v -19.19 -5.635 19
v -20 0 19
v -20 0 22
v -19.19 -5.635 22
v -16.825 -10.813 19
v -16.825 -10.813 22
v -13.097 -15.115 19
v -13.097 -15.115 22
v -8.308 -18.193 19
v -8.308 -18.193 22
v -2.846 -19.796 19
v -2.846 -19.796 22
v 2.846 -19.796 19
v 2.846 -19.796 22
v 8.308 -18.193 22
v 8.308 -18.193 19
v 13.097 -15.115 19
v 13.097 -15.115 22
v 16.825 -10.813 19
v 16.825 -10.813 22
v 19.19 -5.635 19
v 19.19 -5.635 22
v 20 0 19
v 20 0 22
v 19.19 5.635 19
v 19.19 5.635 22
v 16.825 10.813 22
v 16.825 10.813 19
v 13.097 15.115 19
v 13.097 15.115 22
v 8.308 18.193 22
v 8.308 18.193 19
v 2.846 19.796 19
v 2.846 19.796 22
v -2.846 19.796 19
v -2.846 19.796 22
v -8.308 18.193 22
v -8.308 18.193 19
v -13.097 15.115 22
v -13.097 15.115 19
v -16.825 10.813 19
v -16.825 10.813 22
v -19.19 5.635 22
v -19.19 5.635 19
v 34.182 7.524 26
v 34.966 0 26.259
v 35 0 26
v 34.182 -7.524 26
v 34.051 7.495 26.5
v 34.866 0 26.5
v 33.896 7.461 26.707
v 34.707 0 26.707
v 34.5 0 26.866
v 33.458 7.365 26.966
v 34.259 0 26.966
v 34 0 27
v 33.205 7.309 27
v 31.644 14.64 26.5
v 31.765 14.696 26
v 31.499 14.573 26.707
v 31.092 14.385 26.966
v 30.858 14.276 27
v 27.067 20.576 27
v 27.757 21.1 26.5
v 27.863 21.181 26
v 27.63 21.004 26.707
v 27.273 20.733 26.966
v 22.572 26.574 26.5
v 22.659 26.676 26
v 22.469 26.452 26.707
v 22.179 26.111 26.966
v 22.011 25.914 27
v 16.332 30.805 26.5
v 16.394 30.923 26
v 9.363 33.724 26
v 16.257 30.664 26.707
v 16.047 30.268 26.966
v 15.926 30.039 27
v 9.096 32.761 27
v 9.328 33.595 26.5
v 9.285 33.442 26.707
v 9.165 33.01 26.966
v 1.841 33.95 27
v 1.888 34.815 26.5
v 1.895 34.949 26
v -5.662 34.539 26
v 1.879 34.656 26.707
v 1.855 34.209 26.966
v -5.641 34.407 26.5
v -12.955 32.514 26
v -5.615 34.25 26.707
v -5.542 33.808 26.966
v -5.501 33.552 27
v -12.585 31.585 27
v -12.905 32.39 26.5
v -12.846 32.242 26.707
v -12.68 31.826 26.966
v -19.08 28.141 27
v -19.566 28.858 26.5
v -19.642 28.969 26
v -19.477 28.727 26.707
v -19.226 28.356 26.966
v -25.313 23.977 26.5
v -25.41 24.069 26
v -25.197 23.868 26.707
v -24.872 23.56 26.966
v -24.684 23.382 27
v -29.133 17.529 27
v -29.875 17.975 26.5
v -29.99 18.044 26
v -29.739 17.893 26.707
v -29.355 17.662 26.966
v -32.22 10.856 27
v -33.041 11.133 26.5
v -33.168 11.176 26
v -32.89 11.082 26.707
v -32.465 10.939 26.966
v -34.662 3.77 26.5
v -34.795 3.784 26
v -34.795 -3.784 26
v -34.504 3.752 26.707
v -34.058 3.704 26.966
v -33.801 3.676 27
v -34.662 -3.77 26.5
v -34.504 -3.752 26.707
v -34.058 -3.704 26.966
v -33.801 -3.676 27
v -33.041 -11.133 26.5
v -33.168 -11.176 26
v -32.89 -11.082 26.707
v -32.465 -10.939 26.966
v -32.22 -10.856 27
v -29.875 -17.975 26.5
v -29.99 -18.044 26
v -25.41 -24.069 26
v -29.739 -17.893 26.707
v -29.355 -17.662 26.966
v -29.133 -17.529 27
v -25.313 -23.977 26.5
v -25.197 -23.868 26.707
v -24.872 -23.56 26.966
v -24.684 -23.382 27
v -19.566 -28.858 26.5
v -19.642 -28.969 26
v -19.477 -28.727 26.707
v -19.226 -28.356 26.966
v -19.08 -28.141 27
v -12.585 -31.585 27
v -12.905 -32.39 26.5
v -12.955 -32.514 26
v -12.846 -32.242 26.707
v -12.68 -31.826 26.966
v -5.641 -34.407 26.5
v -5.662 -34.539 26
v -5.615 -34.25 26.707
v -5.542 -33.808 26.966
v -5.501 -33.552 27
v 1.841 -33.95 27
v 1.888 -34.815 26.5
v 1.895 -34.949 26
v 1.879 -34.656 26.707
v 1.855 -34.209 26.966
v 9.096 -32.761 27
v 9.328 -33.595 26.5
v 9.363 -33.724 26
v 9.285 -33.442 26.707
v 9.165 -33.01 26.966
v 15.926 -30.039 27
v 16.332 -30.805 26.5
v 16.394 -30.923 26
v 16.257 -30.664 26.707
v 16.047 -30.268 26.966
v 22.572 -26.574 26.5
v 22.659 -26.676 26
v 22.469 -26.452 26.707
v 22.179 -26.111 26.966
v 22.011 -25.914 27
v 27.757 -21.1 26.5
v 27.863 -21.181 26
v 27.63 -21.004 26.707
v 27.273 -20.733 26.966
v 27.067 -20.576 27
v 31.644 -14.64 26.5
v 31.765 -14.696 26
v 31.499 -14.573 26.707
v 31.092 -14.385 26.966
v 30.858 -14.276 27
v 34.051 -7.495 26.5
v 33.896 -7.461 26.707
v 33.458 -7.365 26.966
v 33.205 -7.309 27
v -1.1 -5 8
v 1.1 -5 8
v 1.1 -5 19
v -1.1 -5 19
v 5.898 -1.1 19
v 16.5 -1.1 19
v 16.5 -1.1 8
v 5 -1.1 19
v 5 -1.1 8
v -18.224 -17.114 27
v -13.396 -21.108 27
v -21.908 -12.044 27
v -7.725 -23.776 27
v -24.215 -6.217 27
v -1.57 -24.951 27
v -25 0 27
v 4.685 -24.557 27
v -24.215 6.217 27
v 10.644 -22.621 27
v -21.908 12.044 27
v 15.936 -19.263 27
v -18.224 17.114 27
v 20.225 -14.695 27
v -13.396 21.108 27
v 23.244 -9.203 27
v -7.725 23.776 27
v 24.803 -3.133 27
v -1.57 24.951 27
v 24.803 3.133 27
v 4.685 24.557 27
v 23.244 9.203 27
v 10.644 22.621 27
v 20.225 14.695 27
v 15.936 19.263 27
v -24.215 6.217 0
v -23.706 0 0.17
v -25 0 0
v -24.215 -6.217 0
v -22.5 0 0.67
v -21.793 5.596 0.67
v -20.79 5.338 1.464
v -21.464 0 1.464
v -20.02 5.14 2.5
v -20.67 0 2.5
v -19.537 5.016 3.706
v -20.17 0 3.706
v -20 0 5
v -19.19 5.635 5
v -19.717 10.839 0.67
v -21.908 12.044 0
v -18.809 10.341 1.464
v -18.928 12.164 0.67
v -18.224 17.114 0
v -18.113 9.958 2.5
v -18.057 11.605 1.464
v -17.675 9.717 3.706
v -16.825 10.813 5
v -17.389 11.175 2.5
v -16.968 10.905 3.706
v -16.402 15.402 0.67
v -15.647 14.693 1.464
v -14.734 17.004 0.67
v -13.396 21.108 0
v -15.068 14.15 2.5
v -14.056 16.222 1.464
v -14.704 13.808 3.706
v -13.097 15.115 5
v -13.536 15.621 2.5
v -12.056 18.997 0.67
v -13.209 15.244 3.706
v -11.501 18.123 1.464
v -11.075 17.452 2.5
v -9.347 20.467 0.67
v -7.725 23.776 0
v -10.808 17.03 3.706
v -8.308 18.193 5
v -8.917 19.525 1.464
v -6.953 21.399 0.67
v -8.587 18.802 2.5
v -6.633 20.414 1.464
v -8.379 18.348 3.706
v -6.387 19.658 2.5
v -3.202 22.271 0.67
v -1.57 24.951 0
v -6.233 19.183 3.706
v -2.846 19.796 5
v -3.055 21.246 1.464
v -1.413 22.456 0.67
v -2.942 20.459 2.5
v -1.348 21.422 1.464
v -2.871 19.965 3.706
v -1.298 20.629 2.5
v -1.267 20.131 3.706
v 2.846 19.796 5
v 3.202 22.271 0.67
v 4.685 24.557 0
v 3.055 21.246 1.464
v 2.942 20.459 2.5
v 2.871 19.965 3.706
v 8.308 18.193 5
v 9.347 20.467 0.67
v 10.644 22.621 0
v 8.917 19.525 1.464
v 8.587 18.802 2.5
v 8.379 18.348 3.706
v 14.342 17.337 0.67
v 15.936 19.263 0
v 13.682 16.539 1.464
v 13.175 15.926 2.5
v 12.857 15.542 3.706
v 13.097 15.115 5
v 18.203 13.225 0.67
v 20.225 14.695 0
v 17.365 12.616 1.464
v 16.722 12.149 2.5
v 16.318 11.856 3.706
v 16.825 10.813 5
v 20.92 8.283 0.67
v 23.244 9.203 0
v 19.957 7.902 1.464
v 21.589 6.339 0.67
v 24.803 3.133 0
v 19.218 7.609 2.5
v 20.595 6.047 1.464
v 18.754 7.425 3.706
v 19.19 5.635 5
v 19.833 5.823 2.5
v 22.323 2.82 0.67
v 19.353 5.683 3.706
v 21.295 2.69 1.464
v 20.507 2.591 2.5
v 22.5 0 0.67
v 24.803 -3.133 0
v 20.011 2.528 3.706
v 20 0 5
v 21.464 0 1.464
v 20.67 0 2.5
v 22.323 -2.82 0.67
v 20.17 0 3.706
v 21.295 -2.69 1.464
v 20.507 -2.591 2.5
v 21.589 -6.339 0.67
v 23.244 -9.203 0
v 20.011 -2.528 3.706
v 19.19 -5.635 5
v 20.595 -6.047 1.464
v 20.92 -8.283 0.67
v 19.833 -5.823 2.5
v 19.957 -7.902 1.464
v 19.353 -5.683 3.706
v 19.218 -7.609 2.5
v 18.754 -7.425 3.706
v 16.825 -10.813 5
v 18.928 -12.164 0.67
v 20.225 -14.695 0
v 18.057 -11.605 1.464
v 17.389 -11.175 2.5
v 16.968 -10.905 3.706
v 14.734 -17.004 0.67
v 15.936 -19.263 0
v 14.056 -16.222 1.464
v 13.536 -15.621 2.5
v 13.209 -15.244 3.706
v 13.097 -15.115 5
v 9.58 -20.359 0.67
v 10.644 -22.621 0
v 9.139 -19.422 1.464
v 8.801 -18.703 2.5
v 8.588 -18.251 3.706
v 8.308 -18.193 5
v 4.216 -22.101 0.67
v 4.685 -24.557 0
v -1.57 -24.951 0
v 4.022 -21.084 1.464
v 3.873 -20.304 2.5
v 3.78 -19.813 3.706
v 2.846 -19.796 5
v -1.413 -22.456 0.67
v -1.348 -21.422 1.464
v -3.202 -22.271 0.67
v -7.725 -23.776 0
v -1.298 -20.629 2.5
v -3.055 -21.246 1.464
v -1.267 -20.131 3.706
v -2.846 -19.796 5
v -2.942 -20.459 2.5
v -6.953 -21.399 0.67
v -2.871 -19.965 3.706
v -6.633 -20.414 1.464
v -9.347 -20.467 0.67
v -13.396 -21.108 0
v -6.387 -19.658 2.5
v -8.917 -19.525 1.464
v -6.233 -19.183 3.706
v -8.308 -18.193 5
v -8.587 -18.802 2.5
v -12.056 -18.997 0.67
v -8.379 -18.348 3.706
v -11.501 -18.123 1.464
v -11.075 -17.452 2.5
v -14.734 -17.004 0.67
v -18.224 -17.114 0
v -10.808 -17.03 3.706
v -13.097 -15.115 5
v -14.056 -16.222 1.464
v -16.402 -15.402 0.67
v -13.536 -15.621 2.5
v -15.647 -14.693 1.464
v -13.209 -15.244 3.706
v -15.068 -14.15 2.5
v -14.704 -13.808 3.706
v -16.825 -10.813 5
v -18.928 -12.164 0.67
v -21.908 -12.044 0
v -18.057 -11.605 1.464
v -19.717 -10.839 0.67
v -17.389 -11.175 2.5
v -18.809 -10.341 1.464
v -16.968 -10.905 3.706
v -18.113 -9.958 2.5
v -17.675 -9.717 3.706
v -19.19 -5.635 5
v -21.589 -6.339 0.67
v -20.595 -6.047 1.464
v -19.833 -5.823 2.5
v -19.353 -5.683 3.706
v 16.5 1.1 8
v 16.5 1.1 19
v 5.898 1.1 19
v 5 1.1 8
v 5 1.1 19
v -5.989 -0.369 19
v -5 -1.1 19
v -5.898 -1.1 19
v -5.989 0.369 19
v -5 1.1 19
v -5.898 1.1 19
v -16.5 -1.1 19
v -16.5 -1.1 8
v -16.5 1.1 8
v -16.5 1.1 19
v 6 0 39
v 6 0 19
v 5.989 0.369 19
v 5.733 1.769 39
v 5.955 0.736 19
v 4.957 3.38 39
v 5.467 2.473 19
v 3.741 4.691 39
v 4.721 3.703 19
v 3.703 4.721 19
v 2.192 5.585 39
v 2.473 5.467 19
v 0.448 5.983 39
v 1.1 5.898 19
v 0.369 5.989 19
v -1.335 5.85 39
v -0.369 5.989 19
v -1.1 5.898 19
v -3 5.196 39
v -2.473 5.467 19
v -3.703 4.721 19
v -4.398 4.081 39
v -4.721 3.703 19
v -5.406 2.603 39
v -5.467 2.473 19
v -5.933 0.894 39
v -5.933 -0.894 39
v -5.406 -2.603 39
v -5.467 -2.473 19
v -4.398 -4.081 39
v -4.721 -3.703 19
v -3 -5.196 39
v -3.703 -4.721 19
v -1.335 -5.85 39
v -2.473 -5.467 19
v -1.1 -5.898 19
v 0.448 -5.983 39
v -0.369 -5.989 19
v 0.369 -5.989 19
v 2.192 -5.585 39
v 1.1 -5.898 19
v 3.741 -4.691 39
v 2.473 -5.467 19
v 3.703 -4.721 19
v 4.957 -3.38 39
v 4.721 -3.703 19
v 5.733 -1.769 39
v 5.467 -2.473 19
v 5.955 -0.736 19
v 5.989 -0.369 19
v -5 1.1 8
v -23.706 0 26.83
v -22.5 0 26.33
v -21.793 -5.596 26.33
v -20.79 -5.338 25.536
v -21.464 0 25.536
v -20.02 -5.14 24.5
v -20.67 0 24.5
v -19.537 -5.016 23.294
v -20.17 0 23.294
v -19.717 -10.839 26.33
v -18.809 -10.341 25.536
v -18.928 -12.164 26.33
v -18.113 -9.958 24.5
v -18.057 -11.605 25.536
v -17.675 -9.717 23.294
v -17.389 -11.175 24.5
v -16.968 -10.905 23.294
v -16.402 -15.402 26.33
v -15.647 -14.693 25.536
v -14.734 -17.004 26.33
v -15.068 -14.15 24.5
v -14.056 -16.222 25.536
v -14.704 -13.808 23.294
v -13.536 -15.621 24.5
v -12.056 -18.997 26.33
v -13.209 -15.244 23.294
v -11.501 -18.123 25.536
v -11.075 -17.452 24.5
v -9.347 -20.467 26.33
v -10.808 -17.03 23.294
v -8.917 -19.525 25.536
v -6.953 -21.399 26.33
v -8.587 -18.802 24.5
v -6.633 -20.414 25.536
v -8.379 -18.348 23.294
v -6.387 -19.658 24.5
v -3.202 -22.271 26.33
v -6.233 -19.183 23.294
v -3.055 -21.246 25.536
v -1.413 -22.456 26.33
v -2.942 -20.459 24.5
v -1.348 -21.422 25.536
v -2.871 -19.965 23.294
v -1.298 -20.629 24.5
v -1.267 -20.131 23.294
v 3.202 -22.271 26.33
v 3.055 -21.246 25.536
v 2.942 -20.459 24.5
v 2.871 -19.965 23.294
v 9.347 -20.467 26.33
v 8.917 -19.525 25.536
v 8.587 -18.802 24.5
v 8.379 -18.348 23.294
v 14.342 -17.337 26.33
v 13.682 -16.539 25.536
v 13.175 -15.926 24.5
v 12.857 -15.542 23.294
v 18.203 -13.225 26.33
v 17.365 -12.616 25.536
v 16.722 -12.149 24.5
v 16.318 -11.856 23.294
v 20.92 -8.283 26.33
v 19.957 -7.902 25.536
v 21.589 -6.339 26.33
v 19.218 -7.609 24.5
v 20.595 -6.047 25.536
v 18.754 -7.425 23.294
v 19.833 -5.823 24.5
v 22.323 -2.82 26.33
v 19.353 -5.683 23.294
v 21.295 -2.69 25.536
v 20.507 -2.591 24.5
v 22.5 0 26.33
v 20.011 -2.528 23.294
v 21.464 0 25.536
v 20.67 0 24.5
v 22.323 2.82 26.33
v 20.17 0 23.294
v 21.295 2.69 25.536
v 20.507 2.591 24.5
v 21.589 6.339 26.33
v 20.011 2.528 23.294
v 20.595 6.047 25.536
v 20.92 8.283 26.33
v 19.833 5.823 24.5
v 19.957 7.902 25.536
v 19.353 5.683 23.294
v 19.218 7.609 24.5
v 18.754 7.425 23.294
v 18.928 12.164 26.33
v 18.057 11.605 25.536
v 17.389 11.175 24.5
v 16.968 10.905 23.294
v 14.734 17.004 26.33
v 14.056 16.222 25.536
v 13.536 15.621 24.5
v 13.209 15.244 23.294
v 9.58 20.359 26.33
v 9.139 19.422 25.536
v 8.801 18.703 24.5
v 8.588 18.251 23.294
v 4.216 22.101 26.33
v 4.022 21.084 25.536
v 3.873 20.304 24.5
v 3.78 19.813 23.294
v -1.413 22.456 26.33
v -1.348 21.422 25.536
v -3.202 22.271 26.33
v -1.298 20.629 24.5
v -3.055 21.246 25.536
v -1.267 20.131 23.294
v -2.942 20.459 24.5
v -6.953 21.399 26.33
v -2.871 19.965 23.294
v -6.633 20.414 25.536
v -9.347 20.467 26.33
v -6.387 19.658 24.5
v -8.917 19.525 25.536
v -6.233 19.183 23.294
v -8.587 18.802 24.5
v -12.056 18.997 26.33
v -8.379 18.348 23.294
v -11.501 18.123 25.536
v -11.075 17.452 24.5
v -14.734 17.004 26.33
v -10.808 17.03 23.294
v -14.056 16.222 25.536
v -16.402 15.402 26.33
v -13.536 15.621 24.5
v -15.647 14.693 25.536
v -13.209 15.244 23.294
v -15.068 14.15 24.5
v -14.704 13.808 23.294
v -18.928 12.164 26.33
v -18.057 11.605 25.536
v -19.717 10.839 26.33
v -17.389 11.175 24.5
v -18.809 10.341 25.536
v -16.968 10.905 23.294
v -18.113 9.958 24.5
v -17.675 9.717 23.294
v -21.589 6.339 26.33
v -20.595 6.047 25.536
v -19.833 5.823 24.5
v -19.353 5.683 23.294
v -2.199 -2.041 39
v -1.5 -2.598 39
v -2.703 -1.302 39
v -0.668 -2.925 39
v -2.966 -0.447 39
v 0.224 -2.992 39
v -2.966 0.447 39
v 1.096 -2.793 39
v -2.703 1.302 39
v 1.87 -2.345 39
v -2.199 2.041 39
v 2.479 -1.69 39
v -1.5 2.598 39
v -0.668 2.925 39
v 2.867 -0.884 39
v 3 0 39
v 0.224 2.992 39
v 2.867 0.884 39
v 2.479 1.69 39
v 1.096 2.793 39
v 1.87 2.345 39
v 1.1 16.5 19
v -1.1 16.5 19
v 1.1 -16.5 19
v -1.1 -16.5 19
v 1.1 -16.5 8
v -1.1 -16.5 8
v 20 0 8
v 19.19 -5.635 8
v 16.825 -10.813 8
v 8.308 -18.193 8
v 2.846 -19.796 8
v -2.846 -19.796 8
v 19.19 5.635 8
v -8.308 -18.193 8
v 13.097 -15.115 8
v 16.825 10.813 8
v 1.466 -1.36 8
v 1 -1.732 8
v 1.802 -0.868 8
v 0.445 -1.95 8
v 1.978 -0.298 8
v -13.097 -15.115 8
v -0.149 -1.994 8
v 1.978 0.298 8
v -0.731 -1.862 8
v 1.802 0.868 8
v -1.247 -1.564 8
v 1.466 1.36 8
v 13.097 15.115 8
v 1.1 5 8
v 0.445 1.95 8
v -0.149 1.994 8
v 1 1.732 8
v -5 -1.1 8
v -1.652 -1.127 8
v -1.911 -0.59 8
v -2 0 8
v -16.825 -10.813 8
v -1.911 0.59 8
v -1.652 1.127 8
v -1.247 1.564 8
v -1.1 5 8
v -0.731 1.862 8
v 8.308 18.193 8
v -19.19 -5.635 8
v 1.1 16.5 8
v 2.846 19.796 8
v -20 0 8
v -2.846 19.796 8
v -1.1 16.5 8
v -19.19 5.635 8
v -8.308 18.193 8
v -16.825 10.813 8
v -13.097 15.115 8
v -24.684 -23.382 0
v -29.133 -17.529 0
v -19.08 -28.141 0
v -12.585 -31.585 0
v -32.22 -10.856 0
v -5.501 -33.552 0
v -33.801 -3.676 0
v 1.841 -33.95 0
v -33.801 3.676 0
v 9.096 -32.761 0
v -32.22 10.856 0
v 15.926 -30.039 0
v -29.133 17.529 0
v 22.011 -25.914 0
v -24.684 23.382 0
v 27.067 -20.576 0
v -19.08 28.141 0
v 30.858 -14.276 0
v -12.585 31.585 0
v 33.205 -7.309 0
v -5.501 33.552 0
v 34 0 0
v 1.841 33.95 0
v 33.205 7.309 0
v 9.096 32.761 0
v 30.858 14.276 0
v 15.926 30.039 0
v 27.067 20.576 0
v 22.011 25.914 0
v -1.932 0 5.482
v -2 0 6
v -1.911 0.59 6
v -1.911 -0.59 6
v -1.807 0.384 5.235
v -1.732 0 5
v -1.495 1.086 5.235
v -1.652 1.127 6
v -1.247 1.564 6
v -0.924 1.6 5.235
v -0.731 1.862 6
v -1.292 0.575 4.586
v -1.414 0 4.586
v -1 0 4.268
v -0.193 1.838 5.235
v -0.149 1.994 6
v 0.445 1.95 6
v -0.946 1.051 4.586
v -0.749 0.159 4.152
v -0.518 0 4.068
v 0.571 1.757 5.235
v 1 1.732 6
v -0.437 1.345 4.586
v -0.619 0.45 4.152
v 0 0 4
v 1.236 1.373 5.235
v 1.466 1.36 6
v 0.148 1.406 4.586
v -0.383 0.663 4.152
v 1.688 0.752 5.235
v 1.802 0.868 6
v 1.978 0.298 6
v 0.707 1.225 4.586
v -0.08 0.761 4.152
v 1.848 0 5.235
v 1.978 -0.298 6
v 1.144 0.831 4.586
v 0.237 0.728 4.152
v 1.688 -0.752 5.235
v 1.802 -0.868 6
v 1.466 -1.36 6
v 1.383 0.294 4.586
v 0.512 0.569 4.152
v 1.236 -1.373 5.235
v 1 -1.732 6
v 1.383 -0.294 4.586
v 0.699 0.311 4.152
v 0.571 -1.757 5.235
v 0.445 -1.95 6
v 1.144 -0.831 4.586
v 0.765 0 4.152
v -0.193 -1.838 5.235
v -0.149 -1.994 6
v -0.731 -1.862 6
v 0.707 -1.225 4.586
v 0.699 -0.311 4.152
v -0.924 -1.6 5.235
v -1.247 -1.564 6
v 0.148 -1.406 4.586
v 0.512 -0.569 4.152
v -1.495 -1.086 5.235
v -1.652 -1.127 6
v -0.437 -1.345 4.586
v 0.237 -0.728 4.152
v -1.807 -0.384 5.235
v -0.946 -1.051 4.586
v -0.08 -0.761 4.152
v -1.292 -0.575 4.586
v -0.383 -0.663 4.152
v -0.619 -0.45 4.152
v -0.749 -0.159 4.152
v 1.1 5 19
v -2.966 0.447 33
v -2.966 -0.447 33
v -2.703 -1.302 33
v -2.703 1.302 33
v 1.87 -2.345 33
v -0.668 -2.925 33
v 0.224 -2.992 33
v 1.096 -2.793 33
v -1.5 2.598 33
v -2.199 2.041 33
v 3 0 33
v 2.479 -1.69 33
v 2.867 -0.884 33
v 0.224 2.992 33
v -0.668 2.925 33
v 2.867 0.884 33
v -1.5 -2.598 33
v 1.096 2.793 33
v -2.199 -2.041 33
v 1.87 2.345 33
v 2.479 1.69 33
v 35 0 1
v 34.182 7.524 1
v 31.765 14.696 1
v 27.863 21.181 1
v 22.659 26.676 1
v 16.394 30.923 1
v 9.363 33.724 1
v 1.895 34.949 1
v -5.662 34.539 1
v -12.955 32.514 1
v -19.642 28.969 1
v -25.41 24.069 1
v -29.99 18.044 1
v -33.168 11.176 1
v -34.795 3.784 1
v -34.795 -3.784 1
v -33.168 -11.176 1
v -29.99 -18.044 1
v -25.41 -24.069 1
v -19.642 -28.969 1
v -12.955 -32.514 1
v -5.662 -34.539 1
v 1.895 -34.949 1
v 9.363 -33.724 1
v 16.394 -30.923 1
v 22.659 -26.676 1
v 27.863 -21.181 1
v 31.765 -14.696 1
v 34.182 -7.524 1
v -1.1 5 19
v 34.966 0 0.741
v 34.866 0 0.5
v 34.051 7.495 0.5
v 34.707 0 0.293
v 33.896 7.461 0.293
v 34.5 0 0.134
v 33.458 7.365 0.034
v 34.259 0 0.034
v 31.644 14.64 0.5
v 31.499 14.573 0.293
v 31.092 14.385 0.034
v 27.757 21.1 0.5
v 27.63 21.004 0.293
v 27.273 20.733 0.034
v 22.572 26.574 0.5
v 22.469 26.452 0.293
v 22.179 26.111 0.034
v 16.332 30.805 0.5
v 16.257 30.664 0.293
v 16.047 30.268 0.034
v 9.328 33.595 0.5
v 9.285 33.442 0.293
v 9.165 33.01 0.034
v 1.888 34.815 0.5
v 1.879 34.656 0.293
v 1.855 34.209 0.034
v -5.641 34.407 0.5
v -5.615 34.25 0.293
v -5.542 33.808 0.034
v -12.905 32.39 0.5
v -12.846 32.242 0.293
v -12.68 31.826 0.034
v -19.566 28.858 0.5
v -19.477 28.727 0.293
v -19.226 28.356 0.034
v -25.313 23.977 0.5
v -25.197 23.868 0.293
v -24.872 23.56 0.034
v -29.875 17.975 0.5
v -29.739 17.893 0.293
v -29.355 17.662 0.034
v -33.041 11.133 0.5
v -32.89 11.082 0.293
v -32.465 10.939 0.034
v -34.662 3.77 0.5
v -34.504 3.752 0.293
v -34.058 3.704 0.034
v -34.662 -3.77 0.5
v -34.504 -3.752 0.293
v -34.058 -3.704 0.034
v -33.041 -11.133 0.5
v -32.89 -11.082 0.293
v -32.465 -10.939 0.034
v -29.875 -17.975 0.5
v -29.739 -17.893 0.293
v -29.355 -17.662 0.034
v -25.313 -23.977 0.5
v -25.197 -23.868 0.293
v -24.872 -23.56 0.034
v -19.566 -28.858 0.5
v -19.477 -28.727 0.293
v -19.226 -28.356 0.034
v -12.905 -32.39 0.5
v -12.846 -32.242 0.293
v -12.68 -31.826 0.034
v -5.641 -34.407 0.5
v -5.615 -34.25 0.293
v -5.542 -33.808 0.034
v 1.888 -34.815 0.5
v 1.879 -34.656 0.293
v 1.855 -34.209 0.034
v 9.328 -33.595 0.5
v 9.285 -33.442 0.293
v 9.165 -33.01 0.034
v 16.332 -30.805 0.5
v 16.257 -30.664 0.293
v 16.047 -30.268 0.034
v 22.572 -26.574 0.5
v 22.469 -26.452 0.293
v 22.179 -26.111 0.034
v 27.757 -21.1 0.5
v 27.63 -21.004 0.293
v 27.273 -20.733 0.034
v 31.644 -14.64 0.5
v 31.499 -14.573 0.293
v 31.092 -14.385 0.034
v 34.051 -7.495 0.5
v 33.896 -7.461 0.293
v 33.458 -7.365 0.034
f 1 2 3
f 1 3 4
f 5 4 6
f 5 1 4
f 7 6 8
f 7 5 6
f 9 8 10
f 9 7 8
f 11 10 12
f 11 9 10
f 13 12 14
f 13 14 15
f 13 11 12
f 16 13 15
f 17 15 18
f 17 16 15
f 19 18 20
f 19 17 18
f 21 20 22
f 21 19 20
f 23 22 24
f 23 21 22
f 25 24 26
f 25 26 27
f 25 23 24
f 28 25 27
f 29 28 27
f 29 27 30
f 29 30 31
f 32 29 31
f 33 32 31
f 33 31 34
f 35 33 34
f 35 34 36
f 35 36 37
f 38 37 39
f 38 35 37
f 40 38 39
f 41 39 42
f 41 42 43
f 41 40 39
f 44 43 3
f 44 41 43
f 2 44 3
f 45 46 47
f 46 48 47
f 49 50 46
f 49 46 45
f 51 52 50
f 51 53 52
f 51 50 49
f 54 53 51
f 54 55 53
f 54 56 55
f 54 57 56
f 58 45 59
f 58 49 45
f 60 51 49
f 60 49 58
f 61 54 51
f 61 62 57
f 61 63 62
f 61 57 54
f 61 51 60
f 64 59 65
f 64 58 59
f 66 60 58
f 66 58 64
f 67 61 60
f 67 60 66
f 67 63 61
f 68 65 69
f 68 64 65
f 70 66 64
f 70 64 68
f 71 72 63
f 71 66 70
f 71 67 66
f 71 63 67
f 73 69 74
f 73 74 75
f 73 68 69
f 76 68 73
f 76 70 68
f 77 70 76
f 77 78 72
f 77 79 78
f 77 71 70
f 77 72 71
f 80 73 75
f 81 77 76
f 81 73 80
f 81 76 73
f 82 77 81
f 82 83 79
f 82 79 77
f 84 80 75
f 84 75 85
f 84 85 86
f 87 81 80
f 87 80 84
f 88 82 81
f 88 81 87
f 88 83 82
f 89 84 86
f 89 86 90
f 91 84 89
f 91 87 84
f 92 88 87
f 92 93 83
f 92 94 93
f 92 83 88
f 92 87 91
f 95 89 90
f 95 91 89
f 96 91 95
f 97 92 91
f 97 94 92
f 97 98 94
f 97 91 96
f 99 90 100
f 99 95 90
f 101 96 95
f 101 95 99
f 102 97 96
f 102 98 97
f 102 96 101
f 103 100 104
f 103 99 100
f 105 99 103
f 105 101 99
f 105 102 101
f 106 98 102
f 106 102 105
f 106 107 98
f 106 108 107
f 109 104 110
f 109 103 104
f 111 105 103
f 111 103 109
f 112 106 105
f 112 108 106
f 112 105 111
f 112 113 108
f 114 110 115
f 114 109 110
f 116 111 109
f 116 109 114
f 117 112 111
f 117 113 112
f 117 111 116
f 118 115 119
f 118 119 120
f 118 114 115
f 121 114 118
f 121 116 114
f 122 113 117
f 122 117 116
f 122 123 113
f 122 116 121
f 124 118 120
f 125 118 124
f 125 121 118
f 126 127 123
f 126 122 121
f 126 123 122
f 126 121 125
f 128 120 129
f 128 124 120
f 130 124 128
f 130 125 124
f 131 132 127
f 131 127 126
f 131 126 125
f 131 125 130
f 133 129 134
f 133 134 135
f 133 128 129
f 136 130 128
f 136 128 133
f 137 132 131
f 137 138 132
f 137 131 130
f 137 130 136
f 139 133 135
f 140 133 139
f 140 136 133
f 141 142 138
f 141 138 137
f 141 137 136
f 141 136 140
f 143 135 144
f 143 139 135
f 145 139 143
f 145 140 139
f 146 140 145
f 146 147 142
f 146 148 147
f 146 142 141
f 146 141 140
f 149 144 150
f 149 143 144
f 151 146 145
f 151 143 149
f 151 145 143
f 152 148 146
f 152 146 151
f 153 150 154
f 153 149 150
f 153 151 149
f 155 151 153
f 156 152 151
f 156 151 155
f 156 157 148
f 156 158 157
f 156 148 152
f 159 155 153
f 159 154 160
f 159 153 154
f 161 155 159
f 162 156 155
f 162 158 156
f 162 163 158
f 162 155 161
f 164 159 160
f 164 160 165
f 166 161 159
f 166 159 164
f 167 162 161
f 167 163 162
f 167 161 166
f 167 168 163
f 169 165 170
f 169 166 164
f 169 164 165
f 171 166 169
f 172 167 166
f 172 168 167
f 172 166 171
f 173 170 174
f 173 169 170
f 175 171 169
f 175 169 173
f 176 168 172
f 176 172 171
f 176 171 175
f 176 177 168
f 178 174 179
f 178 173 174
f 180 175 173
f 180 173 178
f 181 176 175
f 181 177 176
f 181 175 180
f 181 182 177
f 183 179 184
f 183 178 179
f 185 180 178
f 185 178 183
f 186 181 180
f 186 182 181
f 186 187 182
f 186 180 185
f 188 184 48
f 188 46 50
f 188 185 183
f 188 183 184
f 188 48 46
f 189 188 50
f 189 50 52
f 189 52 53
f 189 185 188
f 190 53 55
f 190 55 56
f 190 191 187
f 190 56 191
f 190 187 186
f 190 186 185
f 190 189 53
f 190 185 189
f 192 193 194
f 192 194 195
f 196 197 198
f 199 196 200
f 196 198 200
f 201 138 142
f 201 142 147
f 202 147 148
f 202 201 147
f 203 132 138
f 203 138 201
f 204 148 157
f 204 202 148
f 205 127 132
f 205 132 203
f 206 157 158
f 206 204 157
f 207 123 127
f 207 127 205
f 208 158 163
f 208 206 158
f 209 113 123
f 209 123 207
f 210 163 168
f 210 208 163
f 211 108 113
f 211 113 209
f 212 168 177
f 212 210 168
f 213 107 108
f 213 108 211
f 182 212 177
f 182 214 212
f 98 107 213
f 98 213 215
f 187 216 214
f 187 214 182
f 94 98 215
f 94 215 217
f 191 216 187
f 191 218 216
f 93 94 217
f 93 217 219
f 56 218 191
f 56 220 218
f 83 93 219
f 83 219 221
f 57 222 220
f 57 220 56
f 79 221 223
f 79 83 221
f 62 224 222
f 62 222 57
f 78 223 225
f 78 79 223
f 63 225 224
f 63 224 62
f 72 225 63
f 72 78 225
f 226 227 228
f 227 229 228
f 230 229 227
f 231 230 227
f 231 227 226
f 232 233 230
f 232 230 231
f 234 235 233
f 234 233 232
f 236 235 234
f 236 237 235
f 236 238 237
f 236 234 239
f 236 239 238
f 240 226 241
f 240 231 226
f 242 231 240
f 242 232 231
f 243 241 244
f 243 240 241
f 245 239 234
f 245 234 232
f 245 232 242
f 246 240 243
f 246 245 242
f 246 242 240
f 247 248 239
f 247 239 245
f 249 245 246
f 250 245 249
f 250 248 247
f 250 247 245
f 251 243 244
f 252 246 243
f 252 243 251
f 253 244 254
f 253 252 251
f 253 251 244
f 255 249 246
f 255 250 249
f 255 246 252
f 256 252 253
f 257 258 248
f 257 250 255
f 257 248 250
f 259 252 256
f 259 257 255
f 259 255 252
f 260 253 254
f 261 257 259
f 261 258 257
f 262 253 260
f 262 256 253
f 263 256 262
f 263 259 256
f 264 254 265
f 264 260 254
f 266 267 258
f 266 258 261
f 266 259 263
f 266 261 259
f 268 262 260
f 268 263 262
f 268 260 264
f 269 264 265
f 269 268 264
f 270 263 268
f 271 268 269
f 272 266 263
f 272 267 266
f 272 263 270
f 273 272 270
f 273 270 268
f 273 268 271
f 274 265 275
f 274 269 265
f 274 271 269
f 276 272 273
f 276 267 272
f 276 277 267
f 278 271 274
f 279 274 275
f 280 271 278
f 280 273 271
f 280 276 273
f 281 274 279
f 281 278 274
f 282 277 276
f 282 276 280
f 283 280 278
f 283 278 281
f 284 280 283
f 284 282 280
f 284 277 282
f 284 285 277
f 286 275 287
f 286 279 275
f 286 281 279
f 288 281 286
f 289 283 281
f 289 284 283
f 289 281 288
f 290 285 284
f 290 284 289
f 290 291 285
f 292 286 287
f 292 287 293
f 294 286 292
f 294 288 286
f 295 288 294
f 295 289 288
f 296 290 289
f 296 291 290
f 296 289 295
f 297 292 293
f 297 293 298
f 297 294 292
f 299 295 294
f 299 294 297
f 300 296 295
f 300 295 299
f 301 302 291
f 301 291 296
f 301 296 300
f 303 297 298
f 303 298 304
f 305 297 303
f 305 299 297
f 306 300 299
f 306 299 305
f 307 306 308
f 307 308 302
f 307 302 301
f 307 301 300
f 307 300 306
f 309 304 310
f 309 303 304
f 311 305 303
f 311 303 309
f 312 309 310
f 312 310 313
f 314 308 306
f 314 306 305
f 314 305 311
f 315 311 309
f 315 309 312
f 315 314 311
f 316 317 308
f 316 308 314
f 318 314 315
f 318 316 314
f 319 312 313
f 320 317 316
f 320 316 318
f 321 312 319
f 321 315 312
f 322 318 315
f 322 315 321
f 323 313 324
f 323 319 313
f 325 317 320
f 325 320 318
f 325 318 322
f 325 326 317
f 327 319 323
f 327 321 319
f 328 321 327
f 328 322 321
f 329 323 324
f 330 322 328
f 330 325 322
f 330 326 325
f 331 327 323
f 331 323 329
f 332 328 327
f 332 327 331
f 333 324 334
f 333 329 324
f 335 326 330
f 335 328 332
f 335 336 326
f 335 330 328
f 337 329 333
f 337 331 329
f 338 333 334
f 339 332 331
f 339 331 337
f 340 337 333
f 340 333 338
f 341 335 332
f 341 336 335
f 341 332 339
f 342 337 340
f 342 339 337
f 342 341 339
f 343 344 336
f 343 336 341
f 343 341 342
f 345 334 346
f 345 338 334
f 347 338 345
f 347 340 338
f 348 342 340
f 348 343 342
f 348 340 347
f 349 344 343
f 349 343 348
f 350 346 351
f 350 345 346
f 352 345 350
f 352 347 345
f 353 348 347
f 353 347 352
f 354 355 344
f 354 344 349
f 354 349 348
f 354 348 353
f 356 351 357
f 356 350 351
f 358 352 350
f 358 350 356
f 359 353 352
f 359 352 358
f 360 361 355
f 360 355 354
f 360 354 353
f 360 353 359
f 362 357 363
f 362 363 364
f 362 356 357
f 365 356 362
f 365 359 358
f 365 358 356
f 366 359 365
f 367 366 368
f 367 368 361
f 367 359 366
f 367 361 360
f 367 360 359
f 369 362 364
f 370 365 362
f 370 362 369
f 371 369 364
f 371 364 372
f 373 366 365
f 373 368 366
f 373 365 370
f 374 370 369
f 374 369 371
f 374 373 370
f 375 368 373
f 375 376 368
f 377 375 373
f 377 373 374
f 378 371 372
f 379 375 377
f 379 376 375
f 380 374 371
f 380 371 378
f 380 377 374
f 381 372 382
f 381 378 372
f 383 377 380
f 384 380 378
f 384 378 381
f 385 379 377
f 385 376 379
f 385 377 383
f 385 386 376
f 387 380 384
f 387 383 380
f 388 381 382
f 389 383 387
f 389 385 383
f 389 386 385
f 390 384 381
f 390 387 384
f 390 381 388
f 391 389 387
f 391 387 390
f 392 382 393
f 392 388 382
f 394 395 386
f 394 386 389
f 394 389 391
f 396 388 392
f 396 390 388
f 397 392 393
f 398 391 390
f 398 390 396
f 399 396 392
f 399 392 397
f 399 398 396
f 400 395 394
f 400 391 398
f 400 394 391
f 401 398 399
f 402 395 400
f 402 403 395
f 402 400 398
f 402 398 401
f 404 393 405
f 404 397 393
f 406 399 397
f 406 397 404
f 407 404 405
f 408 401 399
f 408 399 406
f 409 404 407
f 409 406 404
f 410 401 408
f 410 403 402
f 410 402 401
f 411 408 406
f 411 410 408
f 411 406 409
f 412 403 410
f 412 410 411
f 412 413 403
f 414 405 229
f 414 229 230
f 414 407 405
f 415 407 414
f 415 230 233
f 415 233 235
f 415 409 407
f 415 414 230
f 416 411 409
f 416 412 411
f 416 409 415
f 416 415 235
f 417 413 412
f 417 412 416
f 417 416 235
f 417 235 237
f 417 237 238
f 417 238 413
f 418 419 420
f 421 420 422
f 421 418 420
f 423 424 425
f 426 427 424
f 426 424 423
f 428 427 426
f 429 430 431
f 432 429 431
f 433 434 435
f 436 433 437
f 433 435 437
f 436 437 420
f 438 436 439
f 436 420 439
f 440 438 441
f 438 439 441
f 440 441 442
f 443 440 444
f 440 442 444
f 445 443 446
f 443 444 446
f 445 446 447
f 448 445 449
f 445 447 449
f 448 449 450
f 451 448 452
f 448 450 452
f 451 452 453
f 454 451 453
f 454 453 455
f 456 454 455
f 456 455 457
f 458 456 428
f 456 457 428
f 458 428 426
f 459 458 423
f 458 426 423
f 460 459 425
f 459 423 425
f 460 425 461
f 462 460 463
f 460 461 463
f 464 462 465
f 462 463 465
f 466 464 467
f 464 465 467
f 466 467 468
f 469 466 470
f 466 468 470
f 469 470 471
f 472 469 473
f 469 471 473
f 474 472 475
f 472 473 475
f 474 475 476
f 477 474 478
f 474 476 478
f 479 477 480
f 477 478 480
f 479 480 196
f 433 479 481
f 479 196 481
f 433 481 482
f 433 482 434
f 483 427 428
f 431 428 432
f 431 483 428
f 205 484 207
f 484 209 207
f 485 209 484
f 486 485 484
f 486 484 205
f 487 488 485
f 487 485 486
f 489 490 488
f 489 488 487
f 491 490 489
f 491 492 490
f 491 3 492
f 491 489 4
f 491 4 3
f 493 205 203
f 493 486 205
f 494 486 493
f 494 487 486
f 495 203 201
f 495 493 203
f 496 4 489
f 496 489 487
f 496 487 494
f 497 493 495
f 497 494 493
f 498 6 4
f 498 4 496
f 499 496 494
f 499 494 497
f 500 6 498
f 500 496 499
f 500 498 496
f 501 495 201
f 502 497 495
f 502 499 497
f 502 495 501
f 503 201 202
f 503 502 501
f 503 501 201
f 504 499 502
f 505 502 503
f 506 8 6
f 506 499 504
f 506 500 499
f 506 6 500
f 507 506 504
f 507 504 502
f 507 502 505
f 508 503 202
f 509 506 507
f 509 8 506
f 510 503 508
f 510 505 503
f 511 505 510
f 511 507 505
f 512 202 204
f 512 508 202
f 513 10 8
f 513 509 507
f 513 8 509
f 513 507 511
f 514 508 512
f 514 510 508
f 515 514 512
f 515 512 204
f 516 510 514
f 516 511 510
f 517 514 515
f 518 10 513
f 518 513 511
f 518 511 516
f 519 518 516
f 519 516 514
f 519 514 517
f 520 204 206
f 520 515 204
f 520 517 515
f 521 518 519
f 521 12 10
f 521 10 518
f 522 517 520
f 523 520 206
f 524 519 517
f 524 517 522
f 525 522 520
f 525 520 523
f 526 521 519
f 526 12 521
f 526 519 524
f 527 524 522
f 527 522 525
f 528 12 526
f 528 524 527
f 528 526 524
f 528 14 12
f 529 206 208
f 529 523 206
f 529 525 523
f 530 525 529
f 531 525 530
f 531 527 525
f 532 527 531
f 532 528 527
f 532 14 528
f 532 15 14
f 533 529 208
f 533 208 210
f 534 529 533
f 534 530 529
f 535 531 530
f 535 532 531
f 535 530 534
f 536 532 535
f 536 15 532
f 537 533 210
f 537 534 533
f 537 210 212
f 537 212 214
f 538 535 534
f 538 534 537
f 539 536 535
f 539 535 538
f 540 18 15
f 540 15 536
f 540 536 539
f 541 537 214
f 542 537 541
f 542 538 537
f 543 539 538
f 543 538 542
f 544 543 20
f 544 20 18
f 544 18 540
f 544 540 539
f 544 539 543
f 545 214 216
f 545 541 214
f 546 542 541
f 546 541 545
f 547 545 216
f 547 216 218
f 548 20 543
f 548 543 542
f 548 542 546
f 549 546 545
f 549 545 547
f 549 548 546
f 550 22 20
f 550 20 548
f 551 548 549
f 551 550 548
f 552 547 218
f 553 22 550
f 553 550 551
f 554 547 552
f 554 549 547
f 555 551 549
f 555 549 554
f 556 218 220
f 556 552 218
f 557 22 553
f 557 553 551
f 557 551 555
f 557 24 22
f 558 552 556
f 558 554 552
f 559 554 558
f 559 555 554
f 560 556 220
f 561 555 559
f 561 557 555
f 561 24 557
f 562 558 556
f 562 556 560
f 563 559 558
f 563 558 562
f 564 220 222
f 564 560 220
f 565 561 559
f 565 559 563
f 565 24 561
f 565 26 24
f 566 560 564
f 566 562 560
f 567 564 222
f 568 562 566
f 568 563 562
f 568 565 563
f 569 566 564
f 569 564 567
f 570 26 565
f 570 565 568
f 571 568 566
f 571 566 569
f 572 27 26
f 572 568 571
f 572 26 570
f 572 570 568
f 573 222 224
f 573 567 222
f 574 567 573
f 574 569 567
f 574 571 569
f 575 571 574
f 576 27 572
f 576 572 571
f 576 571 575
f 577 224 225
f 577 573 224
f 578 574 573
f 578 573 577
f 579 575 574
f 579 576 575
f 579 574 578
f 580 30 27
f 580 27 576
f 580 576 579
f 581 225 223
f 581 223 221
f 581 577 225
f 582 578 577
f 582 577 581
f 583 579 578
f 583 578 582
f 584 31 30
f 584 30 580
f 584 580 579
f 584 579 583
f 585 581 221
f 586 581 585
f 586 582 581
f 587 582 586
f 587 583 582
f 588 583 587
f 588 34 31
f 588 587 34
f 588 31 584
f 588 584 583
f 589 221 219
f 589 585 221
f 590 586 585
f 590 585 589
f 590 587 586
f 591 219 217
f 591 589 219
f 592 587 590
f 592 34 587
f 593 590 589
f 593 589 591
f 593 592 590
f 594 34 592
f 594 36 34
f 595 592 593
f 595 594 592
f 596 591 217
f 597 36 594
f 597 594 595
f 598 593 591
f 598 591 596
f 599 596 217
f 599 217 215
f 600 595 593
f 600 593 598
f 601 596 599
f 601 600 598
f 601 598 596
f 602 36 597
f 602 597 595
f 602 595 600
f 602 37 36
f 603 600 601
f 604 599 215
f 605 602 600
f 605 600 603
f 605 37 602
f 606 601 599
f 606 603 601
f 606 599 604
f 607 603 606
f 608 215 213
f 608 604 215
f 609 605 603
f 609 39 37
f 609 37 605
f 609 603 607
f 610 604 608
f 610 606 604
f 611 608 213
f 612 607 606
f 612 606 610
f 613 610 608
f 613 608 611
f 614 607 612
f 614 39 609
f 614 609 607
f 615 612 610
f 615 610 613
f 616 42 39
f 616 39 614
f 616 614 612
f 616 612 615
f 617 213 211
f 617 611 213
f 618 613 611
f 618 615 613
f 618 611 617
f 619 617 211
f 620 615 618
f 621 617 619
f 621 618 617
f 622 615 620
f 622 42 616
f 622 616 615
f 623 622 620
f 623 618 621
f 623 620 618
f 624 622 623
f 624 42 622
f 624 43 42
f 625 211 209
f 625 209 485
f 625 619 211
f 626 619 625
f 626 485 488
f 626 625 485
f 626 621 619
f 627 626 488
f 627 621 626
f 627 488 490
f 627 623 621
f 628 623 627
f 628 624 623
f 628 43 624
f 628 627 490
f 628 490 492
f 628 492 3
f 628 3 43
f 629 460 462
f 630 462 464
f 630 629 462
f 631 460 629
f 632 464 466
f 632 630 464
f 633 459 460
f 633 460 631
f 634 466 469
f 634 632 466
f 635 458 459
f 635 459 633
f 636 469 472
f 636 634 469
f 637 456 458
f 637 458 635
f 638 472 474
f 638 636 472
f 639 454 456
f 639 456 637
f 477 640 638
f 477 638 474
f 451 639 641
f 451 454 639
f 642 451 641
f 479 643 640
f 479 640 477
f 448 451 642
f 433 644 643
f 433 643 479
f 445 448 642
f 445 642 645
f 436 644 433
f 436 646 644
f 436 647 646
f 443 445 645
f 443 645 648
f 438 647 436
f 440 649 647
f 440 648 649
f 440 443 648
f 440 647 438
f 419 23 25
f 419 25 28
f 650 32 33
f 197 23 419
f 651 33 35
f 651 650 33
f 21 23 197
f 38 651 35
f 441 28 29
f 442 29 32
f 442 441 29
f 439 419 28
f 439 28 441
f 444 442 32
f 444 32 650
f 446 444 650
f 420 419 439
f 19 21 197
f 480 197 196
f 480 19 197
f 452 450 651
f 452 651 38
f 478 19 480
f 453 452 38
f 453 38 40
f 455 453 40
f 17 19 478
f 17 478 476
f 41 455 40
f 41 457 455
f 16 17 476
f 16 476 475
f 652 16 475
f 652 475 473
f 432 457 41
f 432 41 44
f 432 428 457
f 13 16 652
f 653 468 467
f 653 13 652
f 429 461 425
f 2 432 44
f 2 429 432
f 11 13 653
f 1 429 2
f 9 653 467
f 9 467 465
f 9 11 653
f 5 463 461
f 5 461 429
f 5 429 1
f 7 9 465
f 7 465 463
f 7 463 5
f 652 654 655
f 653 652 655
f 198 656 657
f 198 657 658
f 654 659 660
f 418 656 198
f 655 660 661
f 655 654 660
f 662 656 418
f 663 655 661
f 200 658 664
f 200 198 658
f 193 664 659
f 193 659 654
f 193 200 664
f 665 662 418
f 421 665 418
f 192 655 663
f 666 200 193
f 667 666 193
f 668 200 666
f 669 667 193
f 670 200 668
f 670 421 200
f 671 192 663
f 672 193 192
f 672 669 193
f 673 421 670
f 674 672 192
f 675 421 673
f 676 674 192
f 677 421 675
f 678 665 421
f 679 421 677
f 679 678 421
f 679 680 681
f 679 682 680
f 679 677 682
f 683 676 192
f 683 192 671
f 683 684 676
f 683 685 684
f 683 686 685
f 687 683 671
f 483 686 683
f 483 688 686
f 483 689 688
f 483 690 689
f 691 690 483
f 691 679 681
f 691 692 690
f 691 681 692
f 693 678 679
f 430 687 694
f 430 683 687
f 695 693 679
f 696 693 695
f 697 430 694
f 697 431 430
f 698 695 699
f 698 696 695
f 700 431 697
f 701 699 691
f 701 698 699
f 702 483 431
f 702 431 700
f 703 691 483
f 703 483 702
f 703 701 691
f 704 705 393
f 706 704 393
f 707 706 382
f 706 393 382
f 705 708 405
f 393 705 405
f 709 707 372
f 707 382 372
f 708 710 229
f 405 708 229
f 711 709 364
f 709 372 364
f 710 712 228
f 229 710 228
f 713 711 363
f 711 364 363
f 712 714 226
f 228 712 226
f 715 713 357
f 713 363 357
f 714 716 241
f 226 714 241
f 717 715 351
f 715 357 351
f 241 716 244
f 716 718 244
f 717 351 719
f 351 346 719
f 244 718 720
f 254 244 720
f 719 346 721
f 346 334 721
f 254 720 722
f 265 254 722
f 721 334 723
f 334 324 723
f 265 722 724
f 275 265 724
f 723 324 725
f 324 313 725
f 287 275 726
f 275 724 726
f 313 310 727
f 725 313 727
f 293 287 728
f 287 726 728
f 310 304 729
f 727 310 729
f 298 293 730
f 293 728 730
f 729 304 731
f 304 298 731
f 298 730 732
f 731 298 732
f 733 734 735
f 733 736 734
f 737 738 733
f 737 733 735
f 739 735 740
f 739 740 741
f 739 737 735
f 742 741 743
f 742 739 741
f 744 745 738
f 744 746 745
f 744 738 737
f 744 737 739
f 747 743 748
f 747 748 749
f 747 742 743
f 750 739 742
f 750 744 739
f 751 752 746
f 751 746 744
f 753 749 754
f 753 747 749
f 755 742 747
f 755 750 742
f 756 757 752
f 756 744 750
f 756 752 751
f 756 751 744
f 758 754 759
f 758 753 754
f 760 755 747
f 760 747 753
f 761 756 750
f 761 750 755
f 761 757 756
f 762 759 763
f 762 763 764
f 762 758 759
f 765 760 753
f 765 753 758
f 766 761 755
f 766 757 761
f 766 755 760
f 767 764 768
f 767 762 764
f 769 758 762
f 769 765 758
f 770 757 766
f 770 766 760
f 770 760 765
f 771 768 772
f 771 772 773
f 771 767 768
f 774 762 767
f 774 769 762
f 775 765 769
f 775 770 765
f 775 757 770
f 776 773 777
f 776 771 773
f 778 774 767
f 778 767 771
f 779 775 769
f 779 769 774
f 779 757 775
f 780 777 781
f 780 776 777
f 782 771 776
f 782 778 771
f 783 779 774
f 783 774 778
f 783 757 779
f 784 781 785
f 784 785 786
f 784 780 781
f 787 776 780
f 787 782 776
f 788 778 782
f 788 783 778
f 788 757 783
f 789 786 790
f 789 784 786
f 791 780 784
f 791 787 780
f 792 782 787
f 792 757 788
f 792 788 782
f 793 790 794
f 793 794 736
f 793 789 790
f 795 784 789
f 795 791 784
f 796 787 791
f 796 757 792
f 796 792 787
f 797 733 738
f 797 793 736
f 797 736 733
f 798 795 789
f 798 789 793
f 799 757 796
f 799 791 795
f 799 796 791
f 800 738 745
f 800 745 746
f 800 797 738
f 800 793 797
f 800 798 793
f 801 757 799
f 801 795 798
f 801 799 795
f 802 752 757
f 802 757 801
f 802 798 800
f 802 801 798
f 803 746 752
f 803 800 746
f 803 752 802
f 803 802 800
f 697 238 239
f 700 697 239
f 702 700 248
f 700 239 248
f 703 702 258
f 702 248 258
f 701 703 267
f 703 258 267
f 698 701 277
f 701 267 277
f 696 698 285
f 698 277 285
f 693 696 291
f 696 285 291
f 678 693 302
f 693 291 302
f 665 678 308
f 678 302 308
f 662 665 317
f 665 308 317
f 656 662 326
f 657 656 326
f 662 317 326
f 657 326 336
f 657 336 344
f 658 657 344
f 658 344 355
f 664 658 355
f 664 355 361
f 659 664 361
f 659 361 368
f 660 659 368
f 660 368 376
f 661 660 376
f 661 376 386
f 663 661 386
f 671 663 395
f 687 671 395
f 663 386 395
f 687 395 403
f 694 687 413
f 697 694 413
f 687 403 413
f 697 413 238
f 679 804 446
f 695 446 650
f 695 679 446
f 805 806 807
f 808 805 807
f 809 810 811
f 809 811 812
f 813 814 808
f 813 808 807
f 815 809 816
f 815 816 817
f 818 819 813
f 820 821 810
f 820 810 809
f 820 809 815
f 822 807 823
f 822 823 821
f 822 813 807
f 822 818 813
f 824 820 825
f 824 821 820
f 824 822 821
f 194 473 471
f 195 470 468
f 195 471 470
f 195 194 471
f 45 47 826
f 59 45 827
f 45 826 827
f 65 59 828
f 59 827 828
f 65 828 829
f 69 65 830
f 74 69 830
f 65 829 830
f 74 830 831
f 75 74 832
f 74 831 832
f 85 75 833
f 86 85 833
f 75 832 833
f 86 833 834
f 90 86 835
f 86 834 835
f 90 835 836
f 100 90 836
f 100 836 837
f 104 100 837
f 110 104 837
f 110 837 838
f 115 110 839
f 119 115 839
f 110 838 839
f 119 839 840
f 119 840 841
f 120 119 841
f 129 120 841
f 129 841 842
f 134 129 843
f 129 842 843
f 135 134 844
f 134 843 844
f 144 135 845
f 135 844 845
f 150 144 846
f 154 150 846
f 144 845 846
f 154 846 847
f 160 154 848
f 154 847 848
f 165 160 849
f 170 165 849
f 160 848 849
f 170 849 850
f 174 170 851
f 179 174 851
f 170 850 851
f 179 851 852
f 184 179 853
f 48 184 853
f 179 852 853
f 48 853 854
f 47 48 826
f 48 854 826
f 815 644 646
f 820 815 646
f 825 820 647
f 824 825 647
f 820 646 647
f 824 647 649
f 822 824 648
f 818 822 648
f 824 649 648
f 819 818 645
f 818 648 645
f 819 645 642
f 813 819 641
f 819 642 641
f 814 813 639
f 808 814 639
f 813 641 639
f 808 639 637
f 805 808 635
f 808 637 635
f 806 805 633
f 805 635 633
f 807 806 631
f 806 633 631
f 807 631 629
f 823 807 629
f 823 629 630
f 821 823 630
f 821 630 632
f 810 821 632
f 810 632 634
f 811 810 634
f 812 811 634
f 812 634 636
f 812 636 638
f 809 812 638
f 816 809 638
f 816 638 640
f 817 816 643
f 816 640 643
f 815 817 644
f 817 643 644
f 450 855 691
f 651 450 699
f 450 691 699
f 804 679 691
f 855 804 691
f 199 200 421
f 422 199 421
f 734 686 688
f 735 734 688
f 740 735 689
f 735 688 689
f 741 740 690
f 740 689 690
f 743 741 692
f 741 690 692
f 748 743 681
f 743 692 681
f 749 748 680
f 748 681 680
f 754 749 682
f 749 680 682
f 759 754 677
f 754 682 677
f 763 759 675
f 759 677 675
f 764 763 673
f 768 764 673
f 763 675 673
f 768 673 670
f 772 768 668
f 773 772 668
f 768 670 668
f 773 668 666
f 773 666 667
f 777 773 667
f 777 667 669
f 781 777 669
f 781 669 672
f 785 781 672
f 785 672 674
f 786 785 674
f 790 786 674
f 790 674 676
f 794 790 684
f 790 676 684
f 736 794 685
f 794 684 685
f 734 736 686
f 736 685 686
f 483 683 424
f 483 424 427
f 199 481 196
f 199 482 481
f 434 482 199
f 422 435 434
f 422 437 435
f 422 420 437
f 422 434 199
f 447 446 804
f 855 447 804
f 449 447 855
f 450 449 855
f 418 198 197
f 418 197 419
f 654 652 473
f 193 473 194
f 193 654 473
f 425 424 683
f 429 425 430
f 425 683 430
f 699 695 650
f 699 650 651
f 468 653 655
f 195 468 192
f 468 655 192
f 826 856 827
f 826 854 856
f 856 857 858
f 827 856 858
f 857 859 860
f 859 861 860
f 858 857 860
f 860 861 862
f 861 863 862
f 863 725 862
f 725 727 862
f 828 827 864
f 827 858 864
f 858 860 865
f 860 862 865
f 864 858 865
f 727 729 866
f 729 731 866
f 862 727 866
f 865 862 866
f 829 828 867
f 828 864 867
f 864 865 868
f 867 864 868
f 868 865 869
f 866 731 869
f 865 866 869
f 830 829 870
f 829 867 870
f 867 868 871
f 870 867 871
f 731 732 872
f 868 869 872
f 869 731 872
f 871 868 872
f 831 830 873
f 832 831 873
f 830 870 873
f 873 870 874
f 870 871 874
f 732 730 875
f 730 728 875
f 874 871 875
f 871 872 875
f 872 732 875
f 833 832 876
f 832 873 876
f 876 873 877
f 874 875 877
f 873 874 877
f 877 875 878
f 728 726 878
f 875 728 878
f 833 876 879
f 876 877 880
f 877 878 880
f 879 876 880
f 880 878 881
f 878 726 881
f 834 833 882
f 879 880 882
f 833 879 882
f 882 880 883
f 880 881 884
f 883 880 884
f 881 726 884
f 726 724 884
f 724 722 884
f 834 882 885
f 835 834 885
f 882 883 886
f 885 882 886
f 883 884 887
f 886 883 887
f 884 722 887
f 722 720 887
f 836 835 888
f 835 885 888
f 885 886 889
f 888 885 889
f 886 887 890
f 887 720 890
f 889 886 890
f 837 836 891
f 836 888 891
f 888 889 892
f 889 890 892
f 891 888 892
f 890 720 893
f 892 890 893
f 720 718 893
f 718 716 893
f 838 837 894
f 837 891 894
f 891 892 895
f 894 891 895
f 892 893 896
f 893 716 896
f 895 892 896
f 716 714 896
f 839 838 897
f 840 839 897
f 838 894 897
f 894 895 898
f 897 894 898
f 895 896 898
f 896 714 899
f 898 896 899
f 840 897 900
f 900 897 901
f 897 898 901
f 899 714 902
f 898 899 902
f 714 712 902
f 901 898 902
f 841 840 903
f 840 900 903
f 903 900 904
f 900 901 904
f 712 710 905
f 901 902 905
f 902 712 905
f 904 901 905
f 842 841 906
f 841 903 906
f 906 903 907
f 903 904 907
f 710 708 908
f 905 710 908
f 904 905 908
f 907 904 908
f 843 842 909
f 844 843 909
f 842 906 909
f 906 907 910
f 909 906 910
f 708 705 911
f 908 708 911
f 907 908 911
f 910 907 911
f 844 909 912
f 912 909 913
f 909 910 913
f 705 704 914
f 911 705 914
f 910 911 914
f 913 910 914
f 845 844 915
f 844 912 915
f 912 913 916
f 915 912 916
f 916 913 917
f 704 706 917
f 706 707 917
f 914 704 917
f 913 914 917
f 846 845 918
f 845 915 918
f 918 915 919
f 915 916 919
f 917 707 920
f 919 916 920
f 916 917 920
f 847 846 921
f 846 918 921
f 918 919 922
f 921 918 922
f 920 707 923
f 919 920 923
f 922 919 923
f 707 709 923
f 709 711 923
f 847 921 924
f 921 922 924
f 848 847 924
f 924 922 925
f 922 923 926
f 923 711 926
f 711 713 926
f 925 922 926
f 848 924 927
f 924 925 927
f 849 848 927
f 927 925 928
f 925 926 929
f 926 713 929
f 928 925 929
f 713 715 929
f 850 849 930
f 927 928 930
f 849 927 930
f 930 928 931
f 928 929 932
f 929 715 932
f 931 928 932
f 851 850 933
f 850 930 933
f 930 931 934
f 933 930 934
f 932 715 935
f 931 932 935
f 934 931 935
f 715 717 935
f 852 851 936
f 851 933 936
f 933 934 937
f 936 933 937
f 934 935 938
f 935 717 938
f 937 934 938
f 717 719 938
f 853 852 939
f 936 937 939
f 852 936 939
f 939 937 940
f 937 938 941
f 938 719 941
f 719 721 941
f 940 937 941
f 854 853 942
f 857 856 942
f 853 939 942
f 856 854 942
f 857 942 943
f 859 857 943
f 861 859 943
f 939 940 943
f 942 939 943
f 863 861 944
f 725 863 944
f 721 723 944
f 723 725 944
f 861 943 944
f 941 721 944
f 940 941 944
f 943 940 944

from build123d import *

# Parameters (mm, degrees)
SKETCH_1_R          = 35
EXTRUDE_1_DEPTH     = 27
SKETCH_2_R          = 20
CUT_EXTRUDE_1_DEPTH = 8
CUT_EXTRUDE_START   = -8
SKETCH_3_R          = 20
CUT_EXTRUDE_2_DEPTH = 8
FILLET_3_R          = 5
FILLET_4_R          = 5
SKETCH_4_R          = 6
EXTRUDE_2_DEPTH     = 20
SKETCH_5_R          = 3
CUT_EXTRUDE_3_DEPTH = 6
FILLET_5_R          = 1
FILLET_6_R          = 1
SKETCH_6_W          = 11.5
SKETCH_6_H          = 2.2
SKETCH_6_W_2        = 2.2
SKETCH_6_H_2        = 11.5
CUT_EXTRUDE_5_DEPTH = 11
SKETCH_7_R          = 2
EXTRUDE_3_DEPTH     = 4
FILLET_8_R          = 2


with BuildPart() as part:
    # 草图1 → 凸台-拉伸1 (new body)
    with BuildSketch(Plane.XY):
        Circle(SKETCH_1_R)
    extrude(amount=EXTRUDE_1_DEPTH)

    # 草图2 → 切除-拉伸1 (cut)
    with BuildSketch(Plane(origin=(0, 0, 0), x_dir=(-1, 0, 0), z_dir=(0, 0, -1))):
        Circle(SKETCH_2_R)
    extrude(amount=-CUT_EXTRUDE_1_DEPTH, mode=Mode.SUBTRACT)

    # 草图3 → 切除-拉伸2 (cut)
    with BuildSketch(Plane.XY.offset(27).offset(CUT_EXTRUDE_START)):
        with Locations(Location((0, 0, 0), (0, 0, 180))):
            Circle(SKETCH_3_R)
    extrude(amount=CUT_EXTRUDE_2_DEPTH, mode=Mode.SUBTRACT)

    # 圆角3
    fillet_3_edges = [part.edges().sort_by_distance(p)[0] for p in [
        (20, 0, 0),
    ]]
    fillet(fillet_3_edges, radius=FILLET_3_R)

    # 圆角4
    fillet_4_edges = [part.edges().sort_by_distance(p)[0] for p in [
        (20, 0, 27),
    ]]
    fillet(fillet_4_edges, radius=FILLET_4_R)

    # 草图4 → 凸台-拉伸2 (add)
    with BuildSketch(Plane.XY.offset(19)):
        Circle(SKETCH_4_R)
    extrude(amount=EXTRUDE_2_DEPTH)

    # 草图5 → 切除-拉伸3 (cut)
    with BuildSketch(Plane.XY.offset(39)):
        Circle(SKETCH_5_R)
    extrude(amount=-CUT_EXTRUDE_3_DEPTH, mode=Mode.SUBTRACT)

    # 圆角5
    fillet_5_edges = [part.edges().sort_by_distance(p)[0] for p in [
        (-35, 0, 0),
    ]]
    fillet(fillet_5_edges, radius=FILLET_5_R)

    # 圆角6
    fillet_6_edges = [part.edges().sort_by_distance(p)[0] for p in [
        (-35, 0, 27),
    ]]
    fillet(fillet_6_edges, radius=FILLET_6_R)

    # 草图6 → 切除-拉伸5 (cut)
    with BuildSketch(Plane(origin=(0, 0, 8), x_dir=(-1, 0, 0), z_dir=(0, 0, -1))):
        with Locations((10.75, 0)):
            Rectangle(SKETCH_6_W, SKETCH_6_H)
        with Locations((0, -10.75)):
            Rectangle(SKETCH_6_W_2, SKETCH_6_H_2)
        with Locations((0, 10.75)):
            Rectangle(SKETCH_6_W_2, SKETCH_6_H_2)
        with Locations((-10.75, 0)):
            Rectangle(SKETCH_6_W, SKETCH_6_H)
    extrude(amount=-CUT_EXTRUDE_5_DEPTH, mode=Mode.SUBTRACT)

    # 草图7 → 凸台-拉伸3 (add)
    with BuildSketch(Plane(origin=(0, 0, 8), x_dir=(-1, 0, 0), z_dir=(0, 0, -1))):
        Circle(SKETCH_7_R)
    extrude(amount=EXTRUDE_3_DEPTH)

    # 圆角8
    fillet_8_edges = [part.edges().sort_by_distance(p)[0] for p in [
        (2, 0, 4),
    ]]
    fillet(fillet_8_edges, radius=FILLET_8_R)


solid = part.part
